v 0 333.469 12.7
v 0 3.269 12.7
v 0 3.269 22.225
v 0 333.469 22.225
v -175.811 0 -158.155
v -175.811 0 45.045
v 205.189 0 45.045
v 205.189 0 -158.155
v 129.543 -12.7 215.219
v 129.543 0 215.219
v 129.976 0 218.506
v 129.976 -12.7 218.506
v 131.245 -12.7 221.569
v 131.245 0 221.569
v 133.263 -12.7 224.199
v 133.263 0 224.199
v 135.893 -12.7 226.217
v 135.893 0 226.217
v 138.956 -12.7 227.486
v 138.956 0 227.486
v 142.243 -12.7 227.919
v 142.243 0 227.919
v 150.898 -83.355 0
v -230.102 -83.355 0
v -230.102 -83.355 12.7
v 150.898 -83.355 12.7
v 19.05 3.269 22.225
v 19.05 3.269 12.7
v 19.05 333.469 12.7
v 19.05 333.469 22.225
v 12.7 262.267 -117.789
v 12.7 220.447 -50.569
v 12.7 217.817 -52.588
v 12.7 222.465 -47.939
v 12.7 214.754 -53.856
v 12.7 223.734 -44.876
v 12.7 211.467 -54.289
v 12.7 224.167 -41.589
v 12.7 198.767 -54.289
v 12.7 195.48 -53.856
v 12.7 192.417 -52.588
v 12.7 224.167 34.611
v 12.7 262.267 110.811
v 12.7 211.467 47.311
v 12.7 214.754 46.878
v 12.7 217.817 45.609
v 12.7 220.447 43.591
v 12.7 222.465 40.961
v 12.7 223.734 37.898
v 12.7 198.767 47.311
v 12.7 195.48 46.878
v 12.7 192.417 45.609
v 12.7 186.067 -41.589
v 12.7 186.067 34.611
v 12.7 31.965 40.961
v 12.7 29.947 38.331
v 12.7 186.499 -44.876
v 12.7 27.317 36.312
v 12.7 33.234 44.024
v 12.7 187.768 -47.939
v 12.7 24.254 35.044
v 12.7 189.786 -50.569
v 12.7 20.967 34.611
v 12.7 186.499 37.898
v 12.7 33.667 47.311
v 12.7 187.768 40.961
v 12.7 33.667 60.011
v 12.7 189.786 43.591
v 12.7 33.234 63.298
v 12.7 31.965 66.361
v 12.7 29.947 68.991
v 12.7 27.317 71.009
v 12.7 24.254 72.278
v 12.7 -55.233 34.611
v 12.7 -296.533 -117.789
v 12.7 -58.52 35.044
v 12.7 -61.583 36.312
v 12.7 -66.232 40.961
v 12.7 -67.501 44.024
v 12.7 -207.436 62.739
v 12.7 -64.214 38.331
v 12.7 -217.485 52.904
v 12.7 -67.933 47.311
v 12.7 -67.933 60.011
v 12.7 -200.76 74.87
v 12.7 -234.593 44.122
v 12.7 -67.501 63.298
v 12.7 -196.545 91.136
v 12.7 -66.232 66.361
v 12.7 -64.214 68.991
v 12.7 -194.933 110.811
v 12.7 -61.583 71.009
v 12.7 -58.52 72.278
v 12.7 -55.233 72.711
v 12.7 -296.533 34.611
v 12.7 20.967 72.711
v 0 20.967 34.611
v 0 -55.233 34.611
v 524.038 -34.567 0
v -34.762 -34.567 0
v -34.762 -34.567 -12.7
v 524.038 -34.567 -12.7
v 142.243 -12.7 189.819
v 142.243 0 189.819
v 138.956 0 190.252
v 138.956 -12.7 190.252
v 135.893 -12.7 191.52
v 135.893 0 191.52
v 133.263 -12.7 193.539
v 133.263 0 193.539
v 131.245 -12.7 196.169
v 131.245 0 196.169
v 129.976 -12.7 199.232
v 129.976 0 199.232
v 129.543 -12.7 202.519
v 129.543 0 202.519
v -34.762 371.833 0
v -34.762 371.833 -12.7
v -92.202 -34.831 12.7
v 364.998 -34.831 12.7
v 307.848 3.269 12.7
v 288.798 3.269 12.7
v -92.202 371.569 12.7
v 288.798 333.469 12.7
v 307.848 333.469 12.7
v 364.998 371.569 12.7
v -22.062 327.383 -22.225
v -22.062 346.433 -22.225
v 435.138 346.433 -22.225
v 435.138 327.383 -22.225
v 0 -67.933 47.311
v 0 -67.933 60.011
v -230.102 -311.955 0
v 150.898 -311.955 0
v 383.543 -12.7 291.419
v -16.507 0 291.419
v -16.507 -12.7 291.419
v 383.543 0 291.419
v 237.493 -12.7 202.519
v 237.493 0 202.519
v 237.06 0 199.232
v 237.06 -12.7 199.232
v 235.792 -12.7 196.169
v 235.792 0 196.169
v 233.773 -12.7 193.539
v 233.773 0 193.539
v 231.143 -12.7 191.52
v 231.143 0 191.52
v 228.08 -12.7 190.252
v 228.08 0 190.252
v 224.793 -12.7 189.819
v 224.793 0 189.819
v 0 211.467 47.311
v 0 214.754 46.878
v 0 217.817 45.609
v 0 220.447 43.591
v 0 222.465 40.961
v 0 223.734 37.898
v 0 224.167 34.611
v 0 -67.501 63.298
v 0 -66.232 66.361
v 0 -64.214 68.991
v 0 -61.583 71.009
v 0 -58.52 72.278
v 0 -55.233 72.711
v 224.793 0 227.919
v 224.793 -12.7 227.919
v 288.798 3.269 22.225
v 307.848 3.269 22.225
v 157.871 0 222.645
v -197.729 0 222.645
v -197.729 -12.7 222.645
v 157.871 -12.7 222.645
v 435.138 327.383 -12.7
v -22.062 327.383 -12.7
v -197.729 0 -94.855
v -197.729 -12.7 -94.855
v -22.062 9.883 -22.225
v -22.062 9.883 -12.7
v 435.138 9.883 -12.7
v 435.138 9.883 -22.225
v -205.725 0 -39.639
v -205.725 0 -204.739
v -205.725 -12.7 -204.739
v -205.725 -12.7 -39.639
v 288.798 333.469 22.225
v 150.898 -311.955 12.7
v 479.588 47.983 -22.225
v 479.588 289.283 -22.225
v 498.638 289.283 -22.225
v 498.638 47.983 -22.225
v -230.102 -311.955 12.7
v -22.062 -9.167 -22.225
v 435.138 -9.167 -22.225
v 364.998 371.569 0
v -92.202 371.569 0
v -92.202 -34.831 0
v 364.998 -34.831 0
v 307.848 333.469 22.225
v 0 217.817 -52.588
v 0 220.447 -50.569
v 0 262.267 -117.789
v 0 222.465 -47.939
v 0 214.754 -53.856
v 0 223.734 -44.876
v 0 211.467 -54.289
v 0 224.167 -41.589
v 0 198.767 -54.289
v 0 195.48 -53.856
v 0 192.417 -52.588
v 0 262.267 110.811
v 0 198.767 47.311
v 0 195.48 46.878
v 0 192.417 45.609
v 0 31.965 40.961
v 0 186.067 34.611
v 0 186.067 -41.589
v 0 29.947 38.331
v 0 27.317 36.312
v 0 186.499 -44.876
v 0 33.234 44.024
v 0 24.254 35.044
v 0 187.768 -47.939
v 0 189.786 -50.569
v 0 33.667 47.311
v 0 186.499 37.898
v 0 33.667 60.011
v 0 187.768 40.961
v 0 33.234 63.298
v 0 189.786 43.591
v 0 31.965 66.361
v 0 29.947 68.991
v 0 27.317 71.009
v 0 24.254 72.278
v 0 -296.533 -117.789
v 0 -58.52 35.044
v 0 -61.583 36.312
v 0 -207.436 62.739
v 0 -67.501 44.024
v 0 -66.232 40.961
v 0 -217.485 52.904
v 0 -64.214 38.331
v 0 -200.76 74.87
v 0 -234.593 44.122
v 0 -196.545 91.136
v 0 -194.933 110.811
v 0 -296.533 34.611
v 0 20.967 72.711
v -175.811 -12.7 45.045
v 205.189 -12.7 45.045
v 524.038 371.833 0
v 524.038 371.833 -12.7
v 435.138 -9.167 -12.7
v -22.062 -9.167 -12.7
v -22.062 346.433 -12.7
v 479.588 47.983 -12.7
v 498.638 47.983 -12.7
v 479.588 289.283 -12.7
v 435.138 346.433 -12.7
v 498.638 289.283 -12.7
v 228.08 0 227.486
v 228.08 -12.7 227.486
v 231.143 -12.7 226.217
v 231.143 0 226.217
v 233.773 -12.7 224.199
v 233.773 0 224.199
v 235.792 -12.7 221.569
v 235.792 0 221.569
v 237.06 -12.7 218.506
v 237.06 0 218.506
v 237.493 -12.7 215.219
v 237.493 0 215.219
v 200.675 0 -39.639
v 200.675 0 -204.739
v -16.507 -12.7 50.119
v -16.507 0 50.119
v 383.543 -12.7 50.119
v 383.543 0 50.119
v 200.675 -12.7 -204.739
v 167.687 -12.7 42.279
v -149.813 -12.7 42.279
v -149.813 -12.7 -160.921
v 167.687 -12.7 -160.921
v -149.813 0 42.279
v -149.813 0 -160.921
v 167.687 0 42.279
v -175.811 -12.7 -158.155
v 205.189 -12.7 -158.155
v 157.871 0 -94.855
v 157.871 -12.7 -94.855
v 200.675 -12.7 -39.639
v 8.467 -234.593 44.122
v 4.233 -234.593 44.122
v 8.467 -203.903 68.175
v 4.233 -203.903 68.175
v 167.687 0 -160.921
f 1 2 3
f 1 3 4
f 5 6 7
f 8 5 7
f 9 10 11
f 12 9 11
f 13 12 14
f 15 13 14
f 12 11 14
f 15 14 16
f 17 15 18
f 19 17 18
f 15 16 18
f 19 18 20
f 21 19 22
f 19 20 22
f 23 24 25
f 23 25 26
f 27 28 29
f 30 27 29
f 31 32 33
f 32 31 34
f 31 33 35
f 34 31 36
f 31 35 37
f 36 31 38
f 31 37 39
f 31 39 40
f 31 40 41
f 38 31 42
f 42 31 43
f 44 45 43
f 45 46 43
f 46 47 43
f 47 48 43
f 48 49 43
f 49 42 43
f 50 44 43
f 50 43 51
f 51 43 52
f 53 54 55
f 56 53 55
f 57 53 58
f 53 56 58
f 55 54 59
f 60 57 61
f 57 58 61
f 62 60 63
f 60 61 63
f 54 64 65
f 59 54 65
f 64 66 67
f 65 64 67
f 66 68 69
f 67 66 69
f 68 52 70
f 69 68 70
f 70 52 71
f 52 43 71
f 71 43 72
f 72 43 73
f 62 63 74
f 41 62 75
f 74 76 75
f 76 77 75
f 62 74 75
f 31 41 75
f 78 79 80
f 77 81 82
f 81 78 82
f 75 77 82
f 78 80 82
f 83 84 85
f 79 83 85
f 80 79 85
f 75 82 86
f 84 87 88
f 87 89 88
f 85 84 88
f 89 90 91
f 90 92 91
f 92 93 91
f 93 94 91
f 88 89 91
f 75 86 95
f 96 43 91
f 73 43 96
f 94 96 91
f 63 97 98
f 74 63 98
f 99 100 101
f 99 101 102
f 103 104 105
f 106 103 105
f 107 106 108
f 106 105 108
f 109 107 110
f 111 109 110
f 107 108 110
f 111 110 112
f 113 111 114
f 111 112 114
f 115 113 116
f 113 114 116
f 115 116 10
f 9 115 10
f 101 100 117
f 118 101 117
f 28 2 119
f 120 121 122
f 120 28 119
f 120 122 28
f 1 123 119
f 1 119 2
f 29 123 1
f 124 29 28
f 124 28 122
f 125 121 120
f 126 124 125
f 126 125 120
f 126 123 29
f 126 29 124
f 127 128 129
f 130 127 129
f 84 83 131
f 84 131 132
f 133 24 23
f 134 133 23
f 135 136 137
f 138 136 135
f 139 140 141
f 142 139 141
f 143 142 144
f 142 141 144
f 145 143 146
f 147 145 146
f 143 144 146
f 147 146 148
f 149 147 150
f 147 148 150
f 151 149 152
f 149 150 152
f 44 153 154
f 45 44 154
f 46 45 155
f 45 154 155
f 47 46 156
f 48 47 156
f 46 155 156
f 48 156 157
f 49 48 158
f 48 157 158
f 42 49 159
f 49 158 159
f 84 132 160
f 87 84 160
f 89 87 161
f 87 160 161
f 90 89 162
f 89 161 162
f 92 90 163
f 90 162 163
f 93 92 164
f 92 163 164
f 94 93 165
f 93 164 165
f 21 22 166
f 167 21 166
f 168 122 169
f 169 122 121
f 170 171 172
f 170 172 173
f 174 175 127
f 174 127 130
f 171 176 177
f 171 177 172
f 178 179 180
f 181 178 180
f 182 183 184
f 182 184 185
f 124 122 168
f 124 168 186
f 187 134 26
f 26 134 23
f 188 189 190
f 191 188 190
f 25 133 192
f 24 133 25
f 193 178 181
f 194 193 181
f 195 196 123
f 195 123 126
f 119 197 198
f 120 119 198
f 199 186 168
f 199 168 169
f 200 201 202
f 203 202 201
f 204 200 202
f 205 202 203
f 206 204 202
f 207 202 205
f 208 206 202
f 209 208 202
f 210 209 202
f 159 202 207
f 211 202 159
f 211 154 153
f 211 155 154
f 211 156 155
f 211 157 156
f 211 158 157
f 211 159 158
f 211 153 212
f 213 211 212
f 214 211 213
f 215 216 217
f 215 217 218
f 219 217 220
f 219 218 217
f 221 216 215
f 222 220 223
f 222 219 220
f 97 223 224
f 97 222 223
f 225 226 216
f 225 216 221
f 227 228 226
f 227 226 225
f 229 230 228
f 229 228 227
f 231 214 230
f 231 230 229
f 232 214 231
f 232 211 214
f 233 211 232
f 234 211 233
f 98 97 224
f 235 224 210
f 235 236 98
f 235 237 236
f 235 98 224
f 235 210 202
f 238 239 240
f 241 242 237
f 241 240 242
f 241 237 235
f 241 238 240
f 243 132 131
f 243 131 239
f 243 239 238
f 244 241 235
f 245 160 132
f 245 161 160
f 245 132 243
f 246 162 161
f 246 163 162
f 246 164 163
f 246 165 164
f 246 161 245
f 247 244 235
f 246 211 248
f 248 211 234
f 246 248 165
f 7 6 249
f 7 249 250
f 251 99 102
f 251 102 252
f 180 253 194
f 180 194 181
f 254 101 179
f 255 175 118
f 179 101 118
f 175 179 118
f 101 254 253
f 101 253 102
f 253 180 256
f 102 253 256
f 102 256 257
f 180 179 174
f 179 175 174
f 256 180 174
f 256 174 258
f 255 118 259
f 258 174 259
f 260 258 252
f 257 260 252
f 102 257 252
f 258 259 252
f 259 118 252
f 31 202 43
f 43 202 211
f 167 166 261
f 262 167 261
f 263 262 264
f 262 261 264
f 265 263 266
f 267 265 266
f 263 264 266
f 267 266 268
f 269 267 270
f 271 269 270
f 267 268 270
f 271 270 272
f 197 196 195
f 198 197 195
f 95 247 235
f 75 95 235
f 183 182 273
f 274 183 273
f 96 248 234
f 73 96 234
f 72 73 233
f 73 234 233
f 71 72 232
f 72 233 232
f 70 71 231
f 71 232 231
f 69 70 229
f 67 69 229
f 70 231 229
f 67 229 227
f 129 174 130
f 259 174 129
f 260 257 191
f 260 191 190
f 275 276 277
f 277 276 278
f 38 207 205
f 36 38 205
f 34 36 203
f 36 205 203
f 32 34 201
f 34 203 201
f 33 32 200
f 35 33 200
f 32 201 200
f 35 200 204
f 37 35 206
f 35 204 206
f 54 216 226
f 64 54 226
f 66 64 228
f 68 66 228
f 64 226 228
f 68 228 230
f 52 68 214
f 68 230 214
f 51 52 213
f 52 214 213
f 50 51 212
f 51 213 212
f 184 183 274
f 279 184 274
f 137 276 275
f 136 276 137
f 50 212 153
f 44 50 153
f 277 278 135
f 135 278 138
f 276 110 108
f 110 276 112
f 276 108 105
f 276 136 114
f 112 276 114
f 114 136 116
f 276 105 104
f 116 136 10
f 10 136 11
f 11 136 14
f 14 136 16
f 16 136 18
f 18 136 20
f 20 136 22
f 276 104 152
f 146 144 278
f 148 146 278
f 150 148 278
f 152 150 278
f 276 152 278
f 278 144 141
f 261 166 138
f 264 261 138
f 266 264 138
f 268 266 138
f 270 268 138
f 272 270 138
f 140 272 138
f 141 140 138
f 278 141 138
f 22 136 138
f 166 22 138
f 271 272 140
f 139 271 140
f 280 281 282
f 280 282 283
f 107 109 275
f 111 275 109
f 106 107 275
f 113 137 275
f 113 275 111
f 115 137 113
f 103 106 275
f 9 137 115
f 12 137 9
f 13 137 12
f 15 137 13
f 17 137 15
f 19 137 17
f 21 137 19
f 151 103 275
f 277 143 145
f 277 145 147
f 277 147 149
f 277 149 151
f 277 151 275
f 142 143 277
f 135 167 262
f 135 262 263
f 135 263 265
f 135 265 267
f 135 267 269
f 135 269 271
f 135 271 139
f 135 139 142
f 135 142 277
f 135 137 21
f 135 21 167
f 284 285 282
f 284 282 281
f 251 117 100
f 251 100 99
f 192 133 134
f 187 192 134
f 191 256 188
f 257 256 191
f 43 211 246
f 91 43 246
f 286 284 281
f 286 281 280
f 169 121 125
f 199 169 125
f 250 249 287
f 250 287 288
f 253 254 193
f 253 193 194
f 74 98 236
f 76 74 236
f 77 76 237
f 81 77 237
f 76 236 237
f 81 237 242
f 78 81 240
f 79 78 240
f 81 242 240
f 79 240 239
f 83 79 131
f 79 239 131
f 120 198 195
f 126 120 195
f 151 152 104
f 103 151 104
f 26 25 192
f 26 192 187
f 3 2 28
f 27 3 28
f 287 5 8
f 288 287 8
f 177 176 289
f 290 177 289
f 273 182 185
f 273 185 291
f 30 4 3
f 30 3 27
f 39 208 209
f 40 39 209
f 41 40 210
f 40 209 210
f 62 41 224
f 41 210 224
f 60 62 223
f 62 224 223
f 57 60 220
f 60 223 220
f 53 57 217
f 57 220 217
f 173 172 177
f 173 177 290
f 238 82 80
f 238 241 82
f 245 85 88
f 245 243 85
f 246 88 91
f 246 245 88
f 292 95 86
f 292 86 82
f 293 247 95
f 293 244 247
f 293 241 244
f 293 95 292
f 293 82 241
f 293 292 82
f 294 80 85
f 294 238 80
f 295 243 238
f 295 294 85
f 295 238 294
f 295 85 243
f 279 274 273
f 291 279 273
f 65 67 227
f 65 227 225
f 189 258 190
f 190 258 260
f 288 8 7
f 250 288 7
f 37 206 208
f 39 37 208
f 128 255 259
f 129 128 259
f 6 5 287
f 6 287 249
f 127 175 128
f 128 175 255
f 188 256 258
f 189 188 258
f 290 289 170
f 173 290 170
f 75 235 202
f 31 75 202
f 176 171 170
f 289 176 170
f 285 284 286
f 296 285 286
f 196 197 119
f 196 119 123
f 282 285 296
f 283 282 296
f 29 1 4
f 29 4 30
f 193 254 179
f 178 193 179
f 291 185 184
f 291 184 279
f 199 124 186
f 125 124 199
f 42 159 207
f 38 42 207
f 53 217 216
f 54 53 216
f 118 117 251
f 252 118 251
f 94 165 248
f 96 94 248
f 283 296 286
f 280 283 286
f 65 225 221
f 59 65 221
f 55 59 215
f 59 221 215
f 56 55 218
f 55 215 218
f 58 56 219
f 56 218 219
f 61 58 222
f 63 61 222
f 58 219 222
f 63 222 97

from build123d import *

# Parameters (mm, degrees)
F0_W      = 558.8
F0_H      = 406.4
F0_W_2    = 457.2
F0_H_2    = 19.05
F0_W_3    = 19.05
F0_H_3    = 241.3
F1_DEPTH  = 12.7
F2_DEPTH  = 22.225
F3_DEPTH  = 22.225
F4_DEPTH  = 22.225
F5_W      = 457.2
F5_H      = 406.4
F5_W_2    = 19.05
F5_H_2    = 330.2
F6_DEPTH  = 12.7
F7_DEPTH  = 22.225
F8_DEPTH  = 22.225
F9_W      = 406.4
F9_H      = 165.1
F10_DEPTH = 12.7
F12_DEPTH = 12.7
F13_W     = 381
F13_H     = 228.6
F14_DEPTH = 12.7
F15_W     = 400.05
F15_H     = 241.3
F16_DEPTH = 12.7
F17_W     = 317.5
F17_H     = 203.2
F18_DEPTH = 12.7
F19_W     = 381
F19_H     = 203.2
F20_DEPTH = 12.7
F21_W     = 355.6
F21_H     = 317.5
F22_DEPTH = 12.7


with BuildPart() as f1:
    # F0 (on Top) → F1 (new body)
    with BuildSketch(Plane.XY):
        with Locations((244.6383737266, 168.6325731099)):
            Rectangle(F0_W, F0_H)
        with Locations((206.5383737266, 0.3575731099)):
            Rectangle(F0_W_2, F0_H_2, mode=Mode.SUBTRACT)
        with Locations((206.5383737266, 336.9075731099)):
            Rectangle(F0_W_2, F0_H_2, mode=Mode.SUBTRACT)
        with Locations((489.1133737266, 168.6325731099)):
            Rectangle(F0_W_3, F0_H_3, mode=Mode.SUBTRACT)
    extrude(amount=-F1_DEPTH)

    # F0 (on Top) → F2 (join)
    with BuildSketch(Plane.XY):
        with Locations((206.5383737266, 336.9075731099)):
            Rectangle(F0_W_2, F0_H_2)
    extrude(amount=-F2_DEPTH)

    # F0 (on Top) → F3 (join)
    with BuildSketch(Plane.XY):
        with Locations((489.1133737266, 168.6325731099)):
            Rectangle(F0_W_3, F0_H_3)
    extrude(amount=-F3_DEPTH)

    # F0 (on Top) → F4 (join)
    with BuildSketch(Plane.XY):
        with Locations((206.5383737266, 0.3575731099)):
            Rectangle(F0_W_2, F0_H_2)
    extrude(amount=-F4_DEPTH)


with BuildPart() as f6:
    # F5 (on Top) → F6 (new body)
    with BuildSketch(Plane.XY):
        with Locations((136.398, 168.3692485094)):
            Rectangle(F5_W, F5_H)
        with Locations((9.525, 168.3692485094)):
            Rectangle(F5_W_2, F5_H_2, mode=Mode.SUBTRACT)
        with Locations((298.323, 168.3692485094)):
            Rectangle(F5_W_2, F5_H_2, mode=Mode.SUBTRACT)
    extrude(amount=F6_DEPTH)

    # F5 (on Top) → F7 (join)
    with BuildSketch(Plane.XY):
        with Locations((9.525, 168.3692485094)):
            Rectangle(F5_W_2, F5_H_2)
    extrude(amount=F7_DEPTH)

    # F5 (on Top) → F8 (join)
    with BuildSketch(Plane.XY):
        with Locations((298.323, 168.3692485094)):
            Rectangle(F5_W_2, F5_H_2)
    extrude(amount=F8_DEPTH)


with BuildPart() as f10:
    # F9 (on Front) → F10 (new body)
    with BuildSketch(Plane.XZ):
        with Locations((-2.5245882571, -122.1894112668)):
            Rectangle(F9_W, F9_H)
    extrude(amount=F10_DEPTH)


with BuildPart() as f12:
    # F11 (on Right) → F12 (new body)
    with BuildSketch(Plane.YZ):
        with BuildLine():
            Line((-106.0334625381, 110.8109265052), (-194.9334625381, 110.8109265052))
            add(Edge.make_bspline(
                [(-296.5334625381, 34.6109265052), (-215.7922492521, 38.1965605335), (-196.2180797117, 57.5377674894), (-194.9334625381, 110.8109265052)],
                knots=[0, 0, 0, 0, 127, 127, 127, 127], degree=3))
            Line((-296.5334625381, 34.6109265052), (-296.5334625381, -117.7890734948))
            Line((-296.5334625381, -117.7890734948), (-283.8334625381, -117.7890734948))
            Line((-283.8334625381, -117.7890734948), (173.3665374619, -117.7890734948))
            Line((173.3665374619, -117.7890734948), (217.8165374619, -117.7890734948))
            Line((217.8165374619, -117.7890734948), (236.8665374619, -117.7890734948))
            Line((236.8665374619, -117.7890734948), (262.2665374619, -117.7890734948))
            Line((262.2665374619, -117.7890734948), (262.2665374619, 110.8109265052))
            Line((262.2665374619, 110.8109265052), (205.1165374619, 110.8109265052))
            Line((205.1165374619, 110.8109265052), (186.0665374619, 110.8109265052))
            Line((186.0665374619, 110.8109265052), (-86.9834625381, 110.8109265052))
            Line((-86.9834625381, 110.8109265052), (-106.0334625381, 110.8109265052))
        make_face()
        with BuildLine():
            ThreePointArc((-67.9334625381, 60.0109265052), (-64.2137186591, 68.9911826263), (-55.2334625381, 72.7109265052))
            Line((-55.2334625381, 72.7109265052), (20.9665374619, 72.7109265052))
            ThreePointArc((20.9665374619, 72.7109265052), (29.946793583, 68.9911826263), (33.6665374619, 60.0109265052))
            Line((33.6665374619, 60.0109265052), (33.6665374619, 47.3109265052))
            ThreePointArc((33.6665374619, 47.3109265052), (29.946793583, 38.3306703841), (20.9665374619, 34.6109265052))
            Line((20.9665374619, 34.6109265052), (-55.2334625381, 34.6109265052))
            ThreePointArc((-55.2334625381, 34.6109265052), (-64.2137186591, 38.3306703841), (-67.9334625381, 47.3109265052))
            Line((-67.9334625381, 47.3109265052), (-67.9334625381, 60.0109265052))
        make_face(mode=Mode.SUBTRACT)
        with BuildLine():
            ThreePointArc((186.0665374619, 34.6109265052), (189.7862813409, 43.5911826263), (198.7665374619, 47.3109265052))
            Line((198.7665374619, 47.3109265052), (211.4665374619, 47.3109265052))
            ThreePointArc((211.4665374619, 47.3109265052), (220.446793583, 43.5911826263), (224.1665374619, 34.6109265052))
            Line((224.1665374619, 34.6109265052), (224.1665374619, -41.5890734948))
            ThreePointArc((224.1665374619, -41.5890734948), (220.446793583, -50.5693296159), (211.4665374619, -54.2890734948))
            Line((211.4665374619, -54.2890734948), (198.7665374619, -54.2890734948))
            ThreePointArc((198.7665374619, -54.2890734948), (189.7862813409, -50.5693296159), (186.0665374619, -41.5890734948))
            Line((186.0665374619, -41.5890734948), (186.0665374619, 34.6109265052))
        make_face(mode=Mode.SUBTRACT)
    extrude(amount=F12_DEPTH)


with BuildPart() as f14:
    # F13 (on Top) → F14 (new body)
    with BuildSketch(Plane.XY):
        with Locations((-39.6020258009, -197.6545680389)):
            Rectangle(F13_W, F13_H)
    extrude(amount=F14_DEPTH)


with BuildPart() as f16:
    # F15 (on Front) → F16 (new body)
    with BuildSketch(Plane.XZ):
        with Locations((183.5180822253, 170.7687626004)):
            Rectangle(F15_W, F15_H)
        with BuildLine():
            ThreePointArc((129.5430822253, 215.2187626004), (133.2628261043, 224.1990187215), (142.2430822253, 227.9187626004))
            Line((142.2430822253, 227.9187626004), (224.7930822253, 227.9187626004))
            ThreePointArc((224.7930822253, 227.9187626004), (233.7733383464, 224.1990187215), (237.4930822253, 215.2187626004))
            Line((237.4930822253, 215.2187626004), (237.4930822253, 202.5187626004))
            ThreePointArc((237.4930822253, 202.5187626004), (233.7733383464, 193.5385064794), (224.7930822253, 189.8187626004))
            Line((224.7930822253, 189.8187626004), (142.2430822253, 189.8187626004))
            ThreePointArc((142.2430822253, 189.8187626004), (133.2628261043, 193.5385064794), (129.5430822253, 202.5187626004))
            Line((129.5430822253, 202.5187626004), (129.5430822253, 215.2187626004))
        make_face(mode=Mode.SUBTRACT)
    extrude(amount=F16_DEPTH)


with BuildPart() as f18:
    # F17 (on Front) → F18 (new body)
    with BuildSketch(Plane.XZ):
        with Locations((8.9374314994, -59.3209858673)):
            Rectangle(F17_W, F17_H)
    extrude(amount=F18_DEPTH)


with BuildPart() as f20:
    # F19 (on Front) → F20 (new body)
    with BuildSketch(Plane.XZ):
        with Locations((14.6888829768, -56.5550823708)):
            Rectangle(F19_W, F19_H)
    extrude(amount=F20_DEPTH)


with BuildPart() as f22:
    # F21 (on Front) → F22 (new body)
    with BuildSketch(Plane.XZ):
        with Locations((-19.9289359152, 63.8950824002)):
            Rectangle(F21_W, F21_H)
    extrude(amount=F22_DEPTH)


solid = Compound([f1.part, f6.part, f10.part, f12.part, f14.part, f16.part, f18.part, f20.part, f22.part])
